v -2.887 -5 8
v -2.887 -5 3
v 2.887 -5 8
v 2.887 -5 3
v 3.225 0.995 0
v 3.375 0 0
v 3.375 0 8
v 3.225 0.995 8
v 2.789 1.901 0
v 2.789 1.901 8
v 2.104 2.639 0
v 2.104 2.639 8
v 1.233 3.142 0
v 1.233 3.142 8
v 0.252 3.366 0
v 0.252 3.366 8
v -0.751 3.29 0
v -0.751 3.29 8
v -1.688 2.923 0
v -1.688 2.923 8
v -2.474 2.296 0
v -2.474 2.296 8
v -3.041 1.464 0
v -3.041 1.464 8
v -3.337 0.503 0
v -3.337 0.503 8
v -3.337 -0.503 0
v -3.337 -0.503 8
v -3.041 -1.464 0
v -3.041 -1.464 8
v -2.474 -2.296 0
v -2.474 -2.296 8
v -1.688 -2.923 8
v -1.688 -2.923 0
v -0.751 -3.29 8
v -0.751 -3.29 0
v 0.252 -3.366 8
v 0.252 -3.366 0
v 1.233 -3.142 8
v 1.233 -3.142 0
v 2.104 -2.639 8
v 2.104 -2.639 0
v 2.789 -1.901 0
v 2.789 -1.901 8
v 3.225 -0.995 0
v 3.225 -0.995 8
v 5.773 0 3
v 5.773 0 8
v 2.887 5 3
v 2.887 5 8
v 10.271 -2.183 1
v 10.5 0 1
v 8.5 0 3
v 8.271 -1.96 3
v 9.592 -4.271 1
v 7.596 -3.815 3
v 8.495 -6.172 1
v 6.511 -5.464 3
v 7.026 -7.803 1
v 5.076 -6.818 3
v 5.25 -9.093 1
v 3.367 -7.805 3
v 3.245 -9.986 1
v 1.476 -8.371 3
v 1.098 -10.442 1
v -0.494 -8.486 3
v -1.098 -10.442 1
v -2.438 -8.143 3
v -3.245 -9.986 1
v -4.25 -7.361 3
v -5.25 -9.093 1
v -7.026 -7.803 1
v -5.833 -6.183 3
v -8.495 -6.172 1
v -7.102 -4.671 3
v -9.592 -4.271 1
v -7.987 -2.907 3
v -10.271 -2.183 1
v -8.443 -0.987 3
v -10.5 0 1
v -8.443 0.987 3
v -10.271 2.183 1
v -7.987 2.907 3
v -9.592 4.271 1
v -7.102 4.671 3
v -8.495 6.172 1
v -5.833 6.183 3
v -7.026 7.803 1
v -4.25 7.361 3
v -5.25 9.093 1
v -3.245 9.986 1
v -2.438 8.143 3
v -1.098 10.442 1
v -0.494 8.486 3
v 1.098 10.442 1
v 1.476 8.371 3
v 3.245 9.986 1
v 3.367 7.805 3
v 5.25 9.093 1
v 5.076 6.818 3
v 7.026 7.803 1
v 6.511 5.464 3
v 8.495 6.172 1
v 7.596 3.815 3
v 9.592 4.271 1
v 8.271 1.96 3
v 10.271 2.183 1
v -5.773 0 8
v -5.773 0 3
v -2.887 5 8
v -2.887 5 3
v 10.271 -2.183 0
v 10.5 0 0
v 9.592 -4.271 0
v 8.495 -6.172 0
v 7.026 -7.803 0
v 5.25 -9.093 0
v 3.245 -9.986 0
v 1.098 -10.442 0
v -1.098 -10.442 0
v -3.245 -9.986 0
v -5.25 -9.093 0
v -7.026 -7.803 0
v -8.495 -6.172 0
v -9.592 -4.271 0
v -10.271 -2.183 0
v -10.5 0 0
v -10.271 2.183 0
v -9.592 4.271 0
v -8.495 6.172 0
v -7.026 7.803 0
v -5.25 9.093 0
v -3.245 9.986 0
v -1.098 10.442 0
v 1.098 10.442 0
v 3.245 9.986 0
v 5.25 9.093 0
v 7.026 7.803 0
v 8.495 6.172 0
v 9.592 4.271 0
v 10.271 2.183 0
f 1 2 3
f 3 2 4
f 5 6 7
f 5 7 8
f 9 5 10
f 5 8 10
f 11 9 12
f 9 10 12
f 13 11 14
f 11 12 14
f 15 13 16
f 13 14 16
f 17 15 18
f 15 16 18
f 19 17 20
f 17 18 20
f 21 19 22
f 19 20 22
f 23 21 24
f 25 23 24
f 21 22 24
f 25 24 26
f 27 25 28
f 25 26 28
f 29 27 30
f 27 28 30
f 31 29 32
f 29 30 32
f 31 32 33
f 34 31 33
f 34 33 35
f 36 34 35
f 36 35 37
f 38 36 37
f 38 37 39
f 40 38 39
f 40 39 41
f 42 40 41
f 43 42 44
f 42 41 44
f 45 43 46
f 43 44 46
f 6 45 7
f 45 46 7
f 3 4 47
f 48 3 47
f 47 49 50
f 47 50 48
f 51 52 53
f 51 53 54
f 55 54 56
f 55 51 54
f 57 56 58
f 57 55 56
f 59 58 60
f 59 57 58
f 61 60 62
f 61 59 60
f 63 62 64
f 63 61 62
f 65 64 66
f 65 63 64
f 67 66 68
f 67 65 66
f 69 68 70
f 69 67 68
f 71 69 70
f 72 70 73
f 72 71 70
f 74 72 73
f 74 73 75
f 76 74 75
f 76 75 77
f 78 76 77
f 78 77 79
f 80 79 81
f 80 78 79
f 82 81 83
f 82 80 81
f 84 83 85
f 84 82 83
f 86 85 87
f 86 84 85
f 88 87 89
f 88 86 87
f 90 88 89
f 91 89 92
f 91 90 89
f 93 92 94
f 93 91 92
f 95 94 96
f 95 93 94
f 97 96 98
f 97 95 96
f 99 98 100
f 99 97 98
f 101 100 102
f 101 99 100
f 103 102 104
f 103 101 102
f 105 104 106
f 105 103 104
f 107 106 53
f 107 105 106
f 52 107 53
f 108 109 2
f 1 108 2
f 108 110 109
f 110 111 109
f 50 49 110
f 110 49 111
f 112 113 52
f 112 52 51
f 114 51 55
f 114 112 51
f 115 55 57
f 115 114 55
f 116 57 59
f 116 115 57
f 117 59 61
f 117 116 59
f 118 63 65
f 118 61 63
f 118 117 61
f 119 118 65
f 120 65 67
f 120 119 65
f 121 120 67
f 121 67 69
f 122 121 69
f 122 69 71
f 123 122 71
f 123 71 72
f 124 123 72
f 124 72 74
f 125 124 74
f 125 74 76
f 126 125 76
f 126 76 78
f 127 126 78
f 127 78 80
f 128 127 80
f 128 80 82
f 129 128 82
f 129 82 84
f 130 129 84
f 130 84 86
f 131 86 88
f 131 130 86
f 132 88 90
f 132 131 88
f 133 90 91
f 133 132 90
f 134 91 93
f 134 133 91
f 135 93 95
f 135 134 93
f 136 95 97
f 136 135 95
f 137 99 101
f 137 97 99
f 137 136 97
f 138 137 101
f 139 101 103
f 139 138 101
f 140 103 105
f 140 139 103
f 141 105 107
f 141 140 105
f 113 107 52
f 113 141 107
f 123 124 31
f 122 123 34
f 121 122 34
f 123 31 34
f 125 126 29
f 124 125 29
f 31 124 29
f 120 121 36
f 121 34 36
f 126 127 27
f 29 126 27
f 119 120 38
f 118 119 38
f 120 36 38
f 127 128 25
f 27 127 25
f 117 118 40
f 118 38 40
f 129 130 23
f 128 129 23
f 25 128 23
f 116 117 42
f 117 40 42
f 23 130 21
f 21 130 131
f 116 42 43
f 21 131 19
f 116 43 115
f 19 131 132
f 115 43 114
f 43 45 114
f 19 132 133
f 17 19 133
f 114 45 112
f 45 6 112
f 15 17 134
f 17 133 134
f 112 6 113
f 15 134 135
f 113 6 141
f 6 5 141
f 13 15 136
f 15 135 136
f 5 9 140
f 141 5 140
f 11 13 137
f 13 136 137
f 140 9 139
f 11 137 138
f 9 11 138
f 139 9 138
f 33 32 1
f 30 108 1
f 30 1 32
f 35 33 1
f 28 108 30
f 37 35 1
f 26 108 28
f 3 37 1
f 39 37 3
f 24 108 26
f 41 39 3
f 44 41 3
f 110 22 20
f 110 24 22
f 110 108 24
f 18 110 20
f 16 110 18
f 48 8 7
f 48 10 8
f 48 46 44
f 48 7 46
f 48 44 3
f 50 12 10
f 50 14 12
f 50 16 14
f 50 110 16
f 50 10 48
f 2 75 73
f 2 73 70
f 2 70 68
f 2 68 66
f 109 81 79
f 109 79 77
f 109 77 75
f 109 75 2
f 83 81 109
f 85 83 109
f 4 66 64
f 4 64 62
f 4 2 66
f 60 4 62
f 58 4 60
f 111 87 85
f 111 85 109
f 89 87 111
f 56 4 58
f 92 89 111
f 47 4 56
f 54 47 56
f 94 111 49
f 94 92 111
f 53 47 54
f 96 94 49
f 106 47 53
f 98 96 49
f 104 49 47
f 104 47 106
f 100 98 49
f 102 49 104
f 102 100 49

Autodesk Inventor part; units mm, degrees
ref_plane "YZ Plane" through (0, 0, 0) normal (1, 0, 0) x (0, 1, 0)
ref_plane "XZ Plane" through (0, 0, 0) normal (0, 1, 0) x (-1, 0, 0)
ref_plane "XY Plane" through (0, 0, 0) normal (0, 0, 1) x (1, 0, 0)
sketch "Boceto1" plane through (0, 0, 0) normal (0, 0, 1) x (1, 0, 0)
  point P0 (0, 0)
sketch "Boceto2" plane through (0, 0, 0) normal (0, 0, 1) x (1, 0, 0)
  circle A0 centre (0, 0) radius 10.5
  dimension "d0" = 21
extrude "Extrusión1" add sketch "Boceto2" along normal blind 1
sketch "Boceto3" plane through (0, 0, 1) normal (0, 0, 1) x (1, 0, 0)
  circle A0 centre (0, 0) radius 3.375
  circle A1 centre (0, 0) radius 5
  line L0 (0, 5) -> (3, 5)
  line L1 (0, 8.6714) -> (0, 6.7493)
  line L2 (0, 5) -> (-3, 5)
  line L3 (-4.3301, 2.5) -> (-2.8301, 5.0981)
  line L4 (-4.3301, 2.5) -> (-5.8301, -0.0981)
  line L5 (-4.3301, -2.5) -> (-5.8301, 0.0981)
  line L6 (-4.3301, -2.5) -> (-2.8301, -5.0981)
  line L7 (0, -5) -> (-3, -5)
  line L8 (0, -5) -> (3, -5)
  line L9 (4.3301, -2.5) -> (2.8301, -5.0981)
  line L10 (4.3301, -2.5) -> (5.8301, 0.0981)
  line L11 (4.3301, 2.5) -> (5.8301, -0.0981)
  line L12 (4.3301, 2.5) -> (2.8301, 5.0981)
  point P0 (-2.8868, 5)
  point P1 (-5.7735, 0)
  point P2 (-2.8868, -5)
  point P3 (2.8868, -5)
  point P4 (5.7735, 0)
  point P5 (2.8868, 5)
  dimension "d4" = 10
  dimension "d3" = 6.75
  dimension "d5" = 3
  dimension "d8" = 360
extrude "Extrusión2" add sketch "Boceto3" along normal blind 7
sketch "Boceto4" plane through (0, 0, 1) normal (0, 0, 1) x (1, 0, 0)
  circle A0 centre (0, 0) radius 10.5
extrude "Extrusión3" add sketch "Boceto4" along normal blind 2
chamfer "Chaflán1" distance 2 angle 45 1 edges at (-10.5, 0, 3)
sketch "Boceto5" plane through (0, 0, 8) normal (0, 0, 1) x (1, 0, 0)
  circle A0 centre (0, 0) radius 3.375
extrude "Extrusión4" cut sketch "Boceto5" against normal blind 8
properties part number "Tuerca para tornillo"
